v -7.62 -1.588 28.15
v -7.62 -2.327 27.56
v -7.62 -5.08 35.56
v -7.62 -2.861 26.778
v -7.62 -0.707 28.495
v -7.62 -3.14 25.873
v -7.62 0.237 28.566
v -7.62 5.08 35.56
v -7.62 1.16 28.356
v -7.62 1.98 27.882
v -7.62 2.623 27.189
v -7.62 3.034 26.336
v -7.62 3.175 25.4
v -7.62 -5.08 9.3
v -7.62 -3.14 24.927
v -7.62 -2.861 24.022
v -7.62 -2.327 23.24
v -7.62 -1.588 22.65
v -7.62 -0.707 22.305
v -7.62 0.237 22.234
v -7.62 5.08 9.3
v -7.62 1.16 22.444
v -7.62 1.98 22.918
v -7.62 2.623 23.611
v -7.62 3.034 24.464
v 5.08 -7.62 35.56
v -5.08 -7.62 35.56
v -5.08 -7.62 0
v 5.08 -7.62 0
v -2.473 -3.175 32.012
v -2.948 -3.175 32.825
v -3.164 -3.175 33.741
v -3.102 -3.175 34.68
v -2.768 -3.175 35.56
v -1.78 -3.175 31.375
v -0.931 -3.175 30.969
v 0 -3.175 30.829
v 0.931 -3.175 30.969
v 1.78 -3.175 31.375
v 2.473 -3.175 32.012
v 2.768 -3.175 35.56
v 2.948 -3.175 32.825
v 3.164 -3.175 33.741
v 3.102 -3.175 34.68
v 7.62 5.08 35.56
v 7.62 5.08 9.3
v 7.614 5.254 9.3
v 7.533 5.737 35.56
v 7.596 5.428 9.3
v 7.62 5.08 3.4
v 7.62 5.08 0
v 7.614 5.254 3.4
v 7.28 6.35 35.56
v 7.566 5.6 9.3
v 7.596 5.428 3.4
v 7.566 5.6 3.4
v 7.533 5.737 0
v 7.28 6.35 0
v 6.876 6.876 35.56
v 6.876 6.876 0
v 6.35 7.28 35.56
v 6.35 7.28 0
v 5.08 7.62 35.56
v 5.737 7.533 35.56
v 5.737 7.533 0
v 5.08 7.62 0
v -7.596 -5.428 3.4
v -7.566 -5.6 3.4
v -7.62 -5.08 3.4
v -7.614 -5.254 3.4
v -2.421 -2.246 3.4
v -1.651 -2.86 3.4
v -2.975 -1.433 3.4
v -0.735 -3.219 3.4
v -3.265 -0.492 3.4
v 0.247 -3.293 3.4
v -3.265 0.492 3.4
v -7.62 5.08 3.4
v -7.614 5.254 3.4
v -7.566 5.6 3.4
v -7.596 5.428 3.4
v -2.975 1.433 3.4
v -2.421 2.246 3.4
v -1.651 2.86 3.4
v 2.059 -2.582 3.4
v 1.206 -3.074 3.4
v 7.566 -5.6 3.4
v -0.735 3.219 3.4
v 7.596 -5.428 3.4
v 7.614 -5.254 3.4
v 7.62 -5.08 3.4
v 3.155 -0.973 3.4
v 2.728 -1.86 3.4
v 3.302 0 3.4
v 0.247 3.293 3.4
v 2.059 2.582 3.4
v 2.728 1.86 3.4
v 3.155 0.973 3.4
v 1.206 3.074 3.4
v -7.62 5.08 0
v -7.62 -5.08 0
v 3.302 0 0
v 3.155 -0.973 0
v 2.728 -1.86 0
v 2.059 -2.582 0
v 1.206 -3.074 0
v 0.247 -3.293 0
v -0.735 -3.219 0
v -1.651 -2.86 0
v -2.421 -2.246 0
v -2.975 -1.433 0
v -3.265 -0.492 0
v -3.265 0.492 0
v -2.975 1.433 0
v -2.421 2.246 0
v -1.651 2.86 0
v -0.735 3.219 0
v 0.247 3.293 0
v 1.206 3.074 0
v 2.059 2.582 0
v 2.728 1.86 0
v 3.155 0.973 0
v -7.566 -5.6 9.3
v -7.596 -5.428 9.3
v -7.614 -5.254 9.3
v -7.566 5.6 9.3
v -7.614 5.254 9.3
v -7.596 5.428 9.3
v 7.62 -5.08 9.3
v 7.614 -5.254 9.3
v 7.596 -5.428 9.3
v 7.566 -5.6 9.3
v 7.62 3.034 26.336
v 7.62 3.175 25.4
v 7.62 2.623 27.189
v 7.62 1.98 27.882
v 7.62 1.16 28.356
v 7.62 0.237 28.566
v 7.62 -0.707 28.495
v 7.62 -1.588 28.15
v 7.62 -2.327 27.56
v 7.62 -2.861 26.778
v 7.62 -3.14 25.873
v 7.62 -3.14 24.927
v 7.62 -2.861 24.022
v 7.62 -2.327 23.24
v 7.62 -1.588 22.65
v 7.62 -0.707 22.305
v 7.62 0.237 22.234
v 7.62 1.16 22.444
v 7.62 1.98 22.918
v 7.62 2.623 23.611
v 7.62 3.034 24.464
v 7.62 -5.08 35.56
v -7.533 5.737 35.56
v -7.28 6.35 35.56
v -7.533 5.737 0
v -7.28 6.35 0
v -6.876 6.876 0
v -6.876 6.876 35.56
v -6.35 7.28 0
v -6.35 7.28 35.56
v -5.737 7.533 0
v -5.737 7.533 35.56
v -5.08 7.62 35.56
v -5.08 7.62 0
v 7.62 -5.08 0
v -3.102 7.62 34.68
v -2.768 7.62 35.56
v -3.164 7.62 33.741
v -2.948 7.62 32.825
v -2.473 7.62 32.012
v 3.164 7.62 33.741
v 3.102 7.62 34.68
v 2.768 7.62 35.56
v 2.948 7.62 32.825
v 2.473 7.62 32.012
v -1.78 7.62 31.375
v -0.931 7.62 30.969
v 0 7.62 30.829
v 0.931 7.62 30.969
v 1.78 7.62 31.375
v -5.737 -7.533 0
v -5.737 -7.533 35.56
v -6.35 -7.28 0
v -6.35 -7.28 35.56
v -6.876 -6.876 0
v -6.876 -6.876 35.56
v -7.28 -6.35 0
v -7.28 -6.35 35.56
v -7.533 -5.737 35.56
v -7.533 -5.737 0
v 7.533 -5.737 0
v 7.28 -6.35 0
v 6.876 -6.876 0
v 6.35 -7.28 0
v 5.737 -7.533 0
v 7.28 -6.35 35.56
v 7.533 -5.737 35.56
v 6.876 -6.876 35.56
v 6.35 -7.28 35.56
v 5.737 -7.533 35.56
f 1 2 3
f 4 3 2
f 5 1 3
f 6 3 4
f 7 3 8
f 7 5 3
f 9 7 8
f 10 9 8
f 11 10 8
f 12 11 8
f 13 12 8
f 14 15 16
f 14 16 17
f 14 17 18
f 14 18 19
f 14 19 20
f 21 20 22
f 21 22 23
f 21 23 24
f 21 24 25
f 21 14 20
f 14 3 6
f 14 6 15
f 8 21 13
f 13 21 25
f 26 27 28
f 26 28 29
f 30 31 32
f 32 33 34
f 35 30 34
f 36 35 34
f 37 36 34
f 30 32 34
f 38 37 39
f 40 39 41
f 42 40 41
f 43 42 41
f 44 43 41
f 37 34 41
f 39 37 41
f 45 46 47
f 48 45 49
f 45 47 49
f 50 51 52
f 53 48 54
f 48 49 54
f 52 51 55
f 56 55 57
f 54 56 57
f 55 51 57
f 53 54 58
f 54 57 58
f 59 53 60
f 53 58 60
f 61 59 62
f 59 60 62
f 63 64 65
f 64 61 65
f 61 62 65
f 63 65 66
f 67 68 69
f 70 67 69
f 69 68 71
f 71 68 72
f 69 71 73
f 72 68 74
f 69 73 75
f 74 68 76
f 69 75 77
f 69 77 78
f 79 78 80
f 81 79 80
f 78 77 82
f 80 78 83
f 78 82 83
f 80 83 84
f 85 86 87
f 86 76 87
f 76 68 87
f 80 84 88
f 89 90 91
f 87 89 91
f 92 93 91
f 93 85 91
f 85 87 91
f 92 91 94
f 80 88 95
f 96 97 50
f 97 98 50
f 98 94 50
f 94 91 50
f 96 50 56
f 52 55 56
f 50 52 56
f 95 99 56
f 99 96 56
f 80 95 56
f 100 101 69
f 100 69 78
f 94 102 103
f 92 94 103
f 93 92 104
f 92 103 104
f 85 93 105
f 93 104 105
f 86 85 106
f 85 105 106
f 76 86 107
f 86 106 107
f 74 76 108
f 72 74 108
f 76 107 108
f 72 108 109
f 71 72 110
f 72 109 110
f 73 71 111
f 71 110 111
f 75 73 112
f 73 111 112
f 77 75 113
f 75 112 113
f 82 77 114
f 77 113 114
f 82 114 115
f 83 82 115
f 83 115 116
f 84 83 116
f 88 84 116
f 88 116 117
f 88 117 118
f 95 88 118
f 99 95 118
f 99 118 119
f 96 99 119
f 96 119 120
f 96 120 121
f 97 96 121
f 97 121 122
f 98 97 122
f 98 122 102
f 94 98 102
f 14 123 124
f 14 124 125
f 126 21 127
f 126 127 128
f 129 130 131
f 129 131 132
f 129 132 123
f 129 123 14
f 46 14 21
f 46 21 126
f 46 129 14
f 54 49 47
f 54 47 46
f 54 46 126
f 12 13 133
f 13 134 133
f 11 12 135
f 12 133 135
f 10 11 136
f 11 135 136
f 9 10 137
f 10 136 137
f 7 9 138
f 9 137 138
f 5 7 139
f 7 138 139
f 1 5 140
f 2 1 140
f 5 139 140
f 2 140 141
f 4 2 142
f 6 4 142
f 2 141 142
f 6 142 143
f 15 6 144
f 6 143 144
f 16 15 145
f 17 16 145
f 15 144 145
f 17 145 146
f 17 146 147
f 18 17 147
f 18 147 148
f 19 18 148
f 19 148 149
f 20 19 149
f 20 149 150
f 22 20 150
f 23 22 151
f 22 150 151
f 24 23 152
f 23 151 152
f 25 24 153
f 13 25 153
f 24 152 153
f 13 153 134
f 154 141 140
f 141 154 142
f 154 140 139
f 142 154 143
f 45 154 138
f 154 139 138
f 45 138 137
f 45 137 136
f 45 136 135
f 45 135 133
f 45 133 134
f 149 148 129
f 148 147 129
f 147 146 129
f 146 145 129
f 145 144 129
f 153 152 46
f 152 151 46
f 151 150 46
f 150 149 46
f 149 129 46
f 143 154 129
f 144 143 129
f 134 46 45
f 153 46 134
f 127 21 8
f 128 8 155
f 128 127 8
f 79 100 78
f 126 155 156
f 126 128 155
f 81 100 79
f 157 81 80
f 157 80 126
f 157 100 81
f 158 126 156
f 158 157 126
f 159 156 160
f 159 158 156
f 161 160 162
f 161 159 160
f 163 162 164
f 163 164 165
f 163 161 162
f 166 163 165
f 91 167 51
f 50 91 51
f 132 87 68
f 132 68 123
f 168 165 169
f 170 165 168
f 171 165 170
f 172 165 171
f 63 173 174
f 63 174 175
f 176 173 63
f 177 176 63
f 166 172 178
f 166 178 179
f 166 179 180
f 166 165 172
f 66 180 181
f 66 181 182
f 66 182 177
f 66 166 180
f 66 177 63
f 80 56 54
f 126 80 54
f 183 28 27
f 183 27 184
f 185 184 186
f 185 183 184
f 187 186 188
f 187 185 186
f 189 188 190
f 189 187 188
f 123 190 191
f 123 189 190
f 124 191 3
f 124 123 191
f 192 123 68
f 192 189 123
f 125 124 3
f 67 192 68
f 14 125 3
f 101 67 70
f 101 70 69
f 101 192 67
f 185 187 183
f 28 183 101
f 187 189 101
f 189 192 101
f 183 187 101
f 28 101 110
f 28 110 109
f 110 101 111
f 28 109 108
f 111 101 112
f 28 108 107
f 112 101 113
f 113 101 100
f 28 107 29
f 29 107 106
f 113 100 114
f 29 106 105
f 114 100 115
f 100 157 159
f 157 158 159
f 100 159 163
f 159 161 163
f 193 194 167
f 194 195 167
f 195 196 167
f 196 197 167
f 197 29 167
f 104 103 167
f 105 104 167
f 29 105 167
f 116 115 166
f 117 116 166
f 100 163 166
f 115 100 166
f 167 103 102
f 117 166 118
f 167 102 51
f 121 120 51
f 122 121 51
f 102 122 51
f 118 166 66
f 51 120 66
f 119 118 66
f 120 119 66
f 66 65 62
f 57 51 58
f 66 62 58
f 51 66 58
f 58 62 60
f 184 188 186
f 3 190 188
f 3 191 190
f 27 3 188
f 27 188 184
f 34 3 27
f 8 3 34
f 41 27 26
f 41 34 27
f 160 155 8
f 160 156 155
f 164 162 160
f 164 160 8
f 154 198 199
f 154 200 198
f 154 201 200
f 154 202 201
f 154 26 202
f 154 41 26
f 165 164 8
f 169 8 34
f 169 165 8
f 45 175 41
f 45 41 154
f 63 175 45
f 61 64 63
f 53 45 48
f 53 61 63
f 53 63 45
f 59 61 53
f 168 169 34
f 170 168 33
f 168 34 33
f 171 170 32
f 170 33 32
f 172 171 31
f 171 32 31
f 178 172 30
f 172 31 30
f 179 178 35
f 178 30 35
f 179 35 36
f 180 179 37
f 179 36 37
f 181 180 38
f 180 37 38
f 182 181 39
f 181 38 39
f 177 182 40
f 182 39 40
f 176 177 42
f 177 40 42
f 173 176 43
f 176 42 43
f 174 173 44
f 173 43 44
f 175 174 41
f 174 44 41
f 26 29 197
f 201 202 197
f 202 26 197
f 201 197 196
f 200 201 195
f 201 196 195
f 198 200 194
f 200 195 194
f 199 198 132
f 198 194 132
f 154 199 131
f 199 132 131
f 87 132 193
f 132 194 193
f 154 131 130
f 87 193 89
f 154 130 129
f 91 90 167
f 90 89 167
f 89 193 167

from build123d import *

# Parameters (mm, degrees)
F0_W          = 15.24
F0_H          = 15.24
F1_DEPTH      = 35.56
F2_R          = 3.175
F3_DEPTH      = 12.7
F3_DEPTH_BACK = 3.175
F4_R          = 3.175
F4_W          = 11.2
F4_H          = 5.9
F5_DEPTH      = 12.7
F6_T1_DEPTH   = 48.26
F7_R          = 3.302
F8_DEPTH      = 6.35


# Not quite as in the source:
# - a fillet or chamfer that OpenCascade refuses, or shapes differently, is made with other operations: its cross-section is extruded or revolved along the edge and cut away or added


with BuildPart() as f1:
    # F0 (on Top) → F1 (new body)
    with BuildSketch(Plane.XY):
        Rectangle(F0_W, F0_H)
    extrude(amount=F1_DEPTH)

    # F2 (on Front) → F3 (cut, two sides)
    with BuildSketch(Plane.XZ) as f3_sk:
        with Locations((0, 34.00425)):
            Circle(F2_R)
    extrude(amount=-F3_DEPTH, mode=Mode.SUBTRACT)
    extrude(f3_sk.sketch, amount=F3_DEPTH_BACK, mode=Mode.SUBTRACT)

    # F4 (on Right) → F5 (cut, symmetric)
    with BuildSketch(Plane.YZ):
        with Locations((0, 25.4)):
            Circle(F4_R)
        with Locations((0, 6.35)):
            Rectangle(F4_W, F4_H)
    extrude(amount=F5_DEPTH, both=True, mode=Mode.SUBTRACT)

    # F6: fillet of radius 2.54 on 4 edges, made by hand

    # F6_s2 → F6_t1 (cut)
    with BuildSketch(Plane.XY.offset(-6.35)):
        with BuildLine():
            ThreePointArc((7.62, 5.08), (6.8760512242, 6.8760512242), (5.08, 7.62))
            Line((5.08, 7.62), (7.62, 7.62))
            Line((7.62, 7.62), (7.62, 5.08))
        make_face()
        with BuildLine():
            ThreePointArc((5.08, -7.62), (6.8760512242, -6.8760512242), (7.62, -5.08))
            Line((7.62, -5.08), (7.62, -7.62))
            Line((7.62, -7.62), (5.08, -7.62))
        make_face()
        with BuildLine():
            ThreePointArc((-7.62, 5.08), (-6.8760512242, 6.8760512242), (-5.08, 7.62))
            Line((-5.08, 7.62), (-7.62, 7.62))
            Line((-7.62, 7.62), (-7.62, 5.08))
        make_face()
        with BuildLine():
            ThreePointArc((-5.08, -7.62), (-6.8760512242, -6.8760512242), (-7.62, -5.08))
            Line((-7.62, -5.08), (-7.62, -7.62))
            Line((-7.62, -7.62), (-5.08, -7.62))
        make_face()
    extrude(amount=F6_T1_DEPTH, mode=Mode.SUBTRACT)

    # F7 (on face) → F8 (cut)
    with BuildSketch(Plane(origin=(0, 0, 0), x_dir=(1, 0, 0), z_dir=(0, 0, -1))):
        Circle(F7_R)
    extrude(amount=-F8_DEPTH, mode=Mode.SUBTRACT)


solid = f1.part
